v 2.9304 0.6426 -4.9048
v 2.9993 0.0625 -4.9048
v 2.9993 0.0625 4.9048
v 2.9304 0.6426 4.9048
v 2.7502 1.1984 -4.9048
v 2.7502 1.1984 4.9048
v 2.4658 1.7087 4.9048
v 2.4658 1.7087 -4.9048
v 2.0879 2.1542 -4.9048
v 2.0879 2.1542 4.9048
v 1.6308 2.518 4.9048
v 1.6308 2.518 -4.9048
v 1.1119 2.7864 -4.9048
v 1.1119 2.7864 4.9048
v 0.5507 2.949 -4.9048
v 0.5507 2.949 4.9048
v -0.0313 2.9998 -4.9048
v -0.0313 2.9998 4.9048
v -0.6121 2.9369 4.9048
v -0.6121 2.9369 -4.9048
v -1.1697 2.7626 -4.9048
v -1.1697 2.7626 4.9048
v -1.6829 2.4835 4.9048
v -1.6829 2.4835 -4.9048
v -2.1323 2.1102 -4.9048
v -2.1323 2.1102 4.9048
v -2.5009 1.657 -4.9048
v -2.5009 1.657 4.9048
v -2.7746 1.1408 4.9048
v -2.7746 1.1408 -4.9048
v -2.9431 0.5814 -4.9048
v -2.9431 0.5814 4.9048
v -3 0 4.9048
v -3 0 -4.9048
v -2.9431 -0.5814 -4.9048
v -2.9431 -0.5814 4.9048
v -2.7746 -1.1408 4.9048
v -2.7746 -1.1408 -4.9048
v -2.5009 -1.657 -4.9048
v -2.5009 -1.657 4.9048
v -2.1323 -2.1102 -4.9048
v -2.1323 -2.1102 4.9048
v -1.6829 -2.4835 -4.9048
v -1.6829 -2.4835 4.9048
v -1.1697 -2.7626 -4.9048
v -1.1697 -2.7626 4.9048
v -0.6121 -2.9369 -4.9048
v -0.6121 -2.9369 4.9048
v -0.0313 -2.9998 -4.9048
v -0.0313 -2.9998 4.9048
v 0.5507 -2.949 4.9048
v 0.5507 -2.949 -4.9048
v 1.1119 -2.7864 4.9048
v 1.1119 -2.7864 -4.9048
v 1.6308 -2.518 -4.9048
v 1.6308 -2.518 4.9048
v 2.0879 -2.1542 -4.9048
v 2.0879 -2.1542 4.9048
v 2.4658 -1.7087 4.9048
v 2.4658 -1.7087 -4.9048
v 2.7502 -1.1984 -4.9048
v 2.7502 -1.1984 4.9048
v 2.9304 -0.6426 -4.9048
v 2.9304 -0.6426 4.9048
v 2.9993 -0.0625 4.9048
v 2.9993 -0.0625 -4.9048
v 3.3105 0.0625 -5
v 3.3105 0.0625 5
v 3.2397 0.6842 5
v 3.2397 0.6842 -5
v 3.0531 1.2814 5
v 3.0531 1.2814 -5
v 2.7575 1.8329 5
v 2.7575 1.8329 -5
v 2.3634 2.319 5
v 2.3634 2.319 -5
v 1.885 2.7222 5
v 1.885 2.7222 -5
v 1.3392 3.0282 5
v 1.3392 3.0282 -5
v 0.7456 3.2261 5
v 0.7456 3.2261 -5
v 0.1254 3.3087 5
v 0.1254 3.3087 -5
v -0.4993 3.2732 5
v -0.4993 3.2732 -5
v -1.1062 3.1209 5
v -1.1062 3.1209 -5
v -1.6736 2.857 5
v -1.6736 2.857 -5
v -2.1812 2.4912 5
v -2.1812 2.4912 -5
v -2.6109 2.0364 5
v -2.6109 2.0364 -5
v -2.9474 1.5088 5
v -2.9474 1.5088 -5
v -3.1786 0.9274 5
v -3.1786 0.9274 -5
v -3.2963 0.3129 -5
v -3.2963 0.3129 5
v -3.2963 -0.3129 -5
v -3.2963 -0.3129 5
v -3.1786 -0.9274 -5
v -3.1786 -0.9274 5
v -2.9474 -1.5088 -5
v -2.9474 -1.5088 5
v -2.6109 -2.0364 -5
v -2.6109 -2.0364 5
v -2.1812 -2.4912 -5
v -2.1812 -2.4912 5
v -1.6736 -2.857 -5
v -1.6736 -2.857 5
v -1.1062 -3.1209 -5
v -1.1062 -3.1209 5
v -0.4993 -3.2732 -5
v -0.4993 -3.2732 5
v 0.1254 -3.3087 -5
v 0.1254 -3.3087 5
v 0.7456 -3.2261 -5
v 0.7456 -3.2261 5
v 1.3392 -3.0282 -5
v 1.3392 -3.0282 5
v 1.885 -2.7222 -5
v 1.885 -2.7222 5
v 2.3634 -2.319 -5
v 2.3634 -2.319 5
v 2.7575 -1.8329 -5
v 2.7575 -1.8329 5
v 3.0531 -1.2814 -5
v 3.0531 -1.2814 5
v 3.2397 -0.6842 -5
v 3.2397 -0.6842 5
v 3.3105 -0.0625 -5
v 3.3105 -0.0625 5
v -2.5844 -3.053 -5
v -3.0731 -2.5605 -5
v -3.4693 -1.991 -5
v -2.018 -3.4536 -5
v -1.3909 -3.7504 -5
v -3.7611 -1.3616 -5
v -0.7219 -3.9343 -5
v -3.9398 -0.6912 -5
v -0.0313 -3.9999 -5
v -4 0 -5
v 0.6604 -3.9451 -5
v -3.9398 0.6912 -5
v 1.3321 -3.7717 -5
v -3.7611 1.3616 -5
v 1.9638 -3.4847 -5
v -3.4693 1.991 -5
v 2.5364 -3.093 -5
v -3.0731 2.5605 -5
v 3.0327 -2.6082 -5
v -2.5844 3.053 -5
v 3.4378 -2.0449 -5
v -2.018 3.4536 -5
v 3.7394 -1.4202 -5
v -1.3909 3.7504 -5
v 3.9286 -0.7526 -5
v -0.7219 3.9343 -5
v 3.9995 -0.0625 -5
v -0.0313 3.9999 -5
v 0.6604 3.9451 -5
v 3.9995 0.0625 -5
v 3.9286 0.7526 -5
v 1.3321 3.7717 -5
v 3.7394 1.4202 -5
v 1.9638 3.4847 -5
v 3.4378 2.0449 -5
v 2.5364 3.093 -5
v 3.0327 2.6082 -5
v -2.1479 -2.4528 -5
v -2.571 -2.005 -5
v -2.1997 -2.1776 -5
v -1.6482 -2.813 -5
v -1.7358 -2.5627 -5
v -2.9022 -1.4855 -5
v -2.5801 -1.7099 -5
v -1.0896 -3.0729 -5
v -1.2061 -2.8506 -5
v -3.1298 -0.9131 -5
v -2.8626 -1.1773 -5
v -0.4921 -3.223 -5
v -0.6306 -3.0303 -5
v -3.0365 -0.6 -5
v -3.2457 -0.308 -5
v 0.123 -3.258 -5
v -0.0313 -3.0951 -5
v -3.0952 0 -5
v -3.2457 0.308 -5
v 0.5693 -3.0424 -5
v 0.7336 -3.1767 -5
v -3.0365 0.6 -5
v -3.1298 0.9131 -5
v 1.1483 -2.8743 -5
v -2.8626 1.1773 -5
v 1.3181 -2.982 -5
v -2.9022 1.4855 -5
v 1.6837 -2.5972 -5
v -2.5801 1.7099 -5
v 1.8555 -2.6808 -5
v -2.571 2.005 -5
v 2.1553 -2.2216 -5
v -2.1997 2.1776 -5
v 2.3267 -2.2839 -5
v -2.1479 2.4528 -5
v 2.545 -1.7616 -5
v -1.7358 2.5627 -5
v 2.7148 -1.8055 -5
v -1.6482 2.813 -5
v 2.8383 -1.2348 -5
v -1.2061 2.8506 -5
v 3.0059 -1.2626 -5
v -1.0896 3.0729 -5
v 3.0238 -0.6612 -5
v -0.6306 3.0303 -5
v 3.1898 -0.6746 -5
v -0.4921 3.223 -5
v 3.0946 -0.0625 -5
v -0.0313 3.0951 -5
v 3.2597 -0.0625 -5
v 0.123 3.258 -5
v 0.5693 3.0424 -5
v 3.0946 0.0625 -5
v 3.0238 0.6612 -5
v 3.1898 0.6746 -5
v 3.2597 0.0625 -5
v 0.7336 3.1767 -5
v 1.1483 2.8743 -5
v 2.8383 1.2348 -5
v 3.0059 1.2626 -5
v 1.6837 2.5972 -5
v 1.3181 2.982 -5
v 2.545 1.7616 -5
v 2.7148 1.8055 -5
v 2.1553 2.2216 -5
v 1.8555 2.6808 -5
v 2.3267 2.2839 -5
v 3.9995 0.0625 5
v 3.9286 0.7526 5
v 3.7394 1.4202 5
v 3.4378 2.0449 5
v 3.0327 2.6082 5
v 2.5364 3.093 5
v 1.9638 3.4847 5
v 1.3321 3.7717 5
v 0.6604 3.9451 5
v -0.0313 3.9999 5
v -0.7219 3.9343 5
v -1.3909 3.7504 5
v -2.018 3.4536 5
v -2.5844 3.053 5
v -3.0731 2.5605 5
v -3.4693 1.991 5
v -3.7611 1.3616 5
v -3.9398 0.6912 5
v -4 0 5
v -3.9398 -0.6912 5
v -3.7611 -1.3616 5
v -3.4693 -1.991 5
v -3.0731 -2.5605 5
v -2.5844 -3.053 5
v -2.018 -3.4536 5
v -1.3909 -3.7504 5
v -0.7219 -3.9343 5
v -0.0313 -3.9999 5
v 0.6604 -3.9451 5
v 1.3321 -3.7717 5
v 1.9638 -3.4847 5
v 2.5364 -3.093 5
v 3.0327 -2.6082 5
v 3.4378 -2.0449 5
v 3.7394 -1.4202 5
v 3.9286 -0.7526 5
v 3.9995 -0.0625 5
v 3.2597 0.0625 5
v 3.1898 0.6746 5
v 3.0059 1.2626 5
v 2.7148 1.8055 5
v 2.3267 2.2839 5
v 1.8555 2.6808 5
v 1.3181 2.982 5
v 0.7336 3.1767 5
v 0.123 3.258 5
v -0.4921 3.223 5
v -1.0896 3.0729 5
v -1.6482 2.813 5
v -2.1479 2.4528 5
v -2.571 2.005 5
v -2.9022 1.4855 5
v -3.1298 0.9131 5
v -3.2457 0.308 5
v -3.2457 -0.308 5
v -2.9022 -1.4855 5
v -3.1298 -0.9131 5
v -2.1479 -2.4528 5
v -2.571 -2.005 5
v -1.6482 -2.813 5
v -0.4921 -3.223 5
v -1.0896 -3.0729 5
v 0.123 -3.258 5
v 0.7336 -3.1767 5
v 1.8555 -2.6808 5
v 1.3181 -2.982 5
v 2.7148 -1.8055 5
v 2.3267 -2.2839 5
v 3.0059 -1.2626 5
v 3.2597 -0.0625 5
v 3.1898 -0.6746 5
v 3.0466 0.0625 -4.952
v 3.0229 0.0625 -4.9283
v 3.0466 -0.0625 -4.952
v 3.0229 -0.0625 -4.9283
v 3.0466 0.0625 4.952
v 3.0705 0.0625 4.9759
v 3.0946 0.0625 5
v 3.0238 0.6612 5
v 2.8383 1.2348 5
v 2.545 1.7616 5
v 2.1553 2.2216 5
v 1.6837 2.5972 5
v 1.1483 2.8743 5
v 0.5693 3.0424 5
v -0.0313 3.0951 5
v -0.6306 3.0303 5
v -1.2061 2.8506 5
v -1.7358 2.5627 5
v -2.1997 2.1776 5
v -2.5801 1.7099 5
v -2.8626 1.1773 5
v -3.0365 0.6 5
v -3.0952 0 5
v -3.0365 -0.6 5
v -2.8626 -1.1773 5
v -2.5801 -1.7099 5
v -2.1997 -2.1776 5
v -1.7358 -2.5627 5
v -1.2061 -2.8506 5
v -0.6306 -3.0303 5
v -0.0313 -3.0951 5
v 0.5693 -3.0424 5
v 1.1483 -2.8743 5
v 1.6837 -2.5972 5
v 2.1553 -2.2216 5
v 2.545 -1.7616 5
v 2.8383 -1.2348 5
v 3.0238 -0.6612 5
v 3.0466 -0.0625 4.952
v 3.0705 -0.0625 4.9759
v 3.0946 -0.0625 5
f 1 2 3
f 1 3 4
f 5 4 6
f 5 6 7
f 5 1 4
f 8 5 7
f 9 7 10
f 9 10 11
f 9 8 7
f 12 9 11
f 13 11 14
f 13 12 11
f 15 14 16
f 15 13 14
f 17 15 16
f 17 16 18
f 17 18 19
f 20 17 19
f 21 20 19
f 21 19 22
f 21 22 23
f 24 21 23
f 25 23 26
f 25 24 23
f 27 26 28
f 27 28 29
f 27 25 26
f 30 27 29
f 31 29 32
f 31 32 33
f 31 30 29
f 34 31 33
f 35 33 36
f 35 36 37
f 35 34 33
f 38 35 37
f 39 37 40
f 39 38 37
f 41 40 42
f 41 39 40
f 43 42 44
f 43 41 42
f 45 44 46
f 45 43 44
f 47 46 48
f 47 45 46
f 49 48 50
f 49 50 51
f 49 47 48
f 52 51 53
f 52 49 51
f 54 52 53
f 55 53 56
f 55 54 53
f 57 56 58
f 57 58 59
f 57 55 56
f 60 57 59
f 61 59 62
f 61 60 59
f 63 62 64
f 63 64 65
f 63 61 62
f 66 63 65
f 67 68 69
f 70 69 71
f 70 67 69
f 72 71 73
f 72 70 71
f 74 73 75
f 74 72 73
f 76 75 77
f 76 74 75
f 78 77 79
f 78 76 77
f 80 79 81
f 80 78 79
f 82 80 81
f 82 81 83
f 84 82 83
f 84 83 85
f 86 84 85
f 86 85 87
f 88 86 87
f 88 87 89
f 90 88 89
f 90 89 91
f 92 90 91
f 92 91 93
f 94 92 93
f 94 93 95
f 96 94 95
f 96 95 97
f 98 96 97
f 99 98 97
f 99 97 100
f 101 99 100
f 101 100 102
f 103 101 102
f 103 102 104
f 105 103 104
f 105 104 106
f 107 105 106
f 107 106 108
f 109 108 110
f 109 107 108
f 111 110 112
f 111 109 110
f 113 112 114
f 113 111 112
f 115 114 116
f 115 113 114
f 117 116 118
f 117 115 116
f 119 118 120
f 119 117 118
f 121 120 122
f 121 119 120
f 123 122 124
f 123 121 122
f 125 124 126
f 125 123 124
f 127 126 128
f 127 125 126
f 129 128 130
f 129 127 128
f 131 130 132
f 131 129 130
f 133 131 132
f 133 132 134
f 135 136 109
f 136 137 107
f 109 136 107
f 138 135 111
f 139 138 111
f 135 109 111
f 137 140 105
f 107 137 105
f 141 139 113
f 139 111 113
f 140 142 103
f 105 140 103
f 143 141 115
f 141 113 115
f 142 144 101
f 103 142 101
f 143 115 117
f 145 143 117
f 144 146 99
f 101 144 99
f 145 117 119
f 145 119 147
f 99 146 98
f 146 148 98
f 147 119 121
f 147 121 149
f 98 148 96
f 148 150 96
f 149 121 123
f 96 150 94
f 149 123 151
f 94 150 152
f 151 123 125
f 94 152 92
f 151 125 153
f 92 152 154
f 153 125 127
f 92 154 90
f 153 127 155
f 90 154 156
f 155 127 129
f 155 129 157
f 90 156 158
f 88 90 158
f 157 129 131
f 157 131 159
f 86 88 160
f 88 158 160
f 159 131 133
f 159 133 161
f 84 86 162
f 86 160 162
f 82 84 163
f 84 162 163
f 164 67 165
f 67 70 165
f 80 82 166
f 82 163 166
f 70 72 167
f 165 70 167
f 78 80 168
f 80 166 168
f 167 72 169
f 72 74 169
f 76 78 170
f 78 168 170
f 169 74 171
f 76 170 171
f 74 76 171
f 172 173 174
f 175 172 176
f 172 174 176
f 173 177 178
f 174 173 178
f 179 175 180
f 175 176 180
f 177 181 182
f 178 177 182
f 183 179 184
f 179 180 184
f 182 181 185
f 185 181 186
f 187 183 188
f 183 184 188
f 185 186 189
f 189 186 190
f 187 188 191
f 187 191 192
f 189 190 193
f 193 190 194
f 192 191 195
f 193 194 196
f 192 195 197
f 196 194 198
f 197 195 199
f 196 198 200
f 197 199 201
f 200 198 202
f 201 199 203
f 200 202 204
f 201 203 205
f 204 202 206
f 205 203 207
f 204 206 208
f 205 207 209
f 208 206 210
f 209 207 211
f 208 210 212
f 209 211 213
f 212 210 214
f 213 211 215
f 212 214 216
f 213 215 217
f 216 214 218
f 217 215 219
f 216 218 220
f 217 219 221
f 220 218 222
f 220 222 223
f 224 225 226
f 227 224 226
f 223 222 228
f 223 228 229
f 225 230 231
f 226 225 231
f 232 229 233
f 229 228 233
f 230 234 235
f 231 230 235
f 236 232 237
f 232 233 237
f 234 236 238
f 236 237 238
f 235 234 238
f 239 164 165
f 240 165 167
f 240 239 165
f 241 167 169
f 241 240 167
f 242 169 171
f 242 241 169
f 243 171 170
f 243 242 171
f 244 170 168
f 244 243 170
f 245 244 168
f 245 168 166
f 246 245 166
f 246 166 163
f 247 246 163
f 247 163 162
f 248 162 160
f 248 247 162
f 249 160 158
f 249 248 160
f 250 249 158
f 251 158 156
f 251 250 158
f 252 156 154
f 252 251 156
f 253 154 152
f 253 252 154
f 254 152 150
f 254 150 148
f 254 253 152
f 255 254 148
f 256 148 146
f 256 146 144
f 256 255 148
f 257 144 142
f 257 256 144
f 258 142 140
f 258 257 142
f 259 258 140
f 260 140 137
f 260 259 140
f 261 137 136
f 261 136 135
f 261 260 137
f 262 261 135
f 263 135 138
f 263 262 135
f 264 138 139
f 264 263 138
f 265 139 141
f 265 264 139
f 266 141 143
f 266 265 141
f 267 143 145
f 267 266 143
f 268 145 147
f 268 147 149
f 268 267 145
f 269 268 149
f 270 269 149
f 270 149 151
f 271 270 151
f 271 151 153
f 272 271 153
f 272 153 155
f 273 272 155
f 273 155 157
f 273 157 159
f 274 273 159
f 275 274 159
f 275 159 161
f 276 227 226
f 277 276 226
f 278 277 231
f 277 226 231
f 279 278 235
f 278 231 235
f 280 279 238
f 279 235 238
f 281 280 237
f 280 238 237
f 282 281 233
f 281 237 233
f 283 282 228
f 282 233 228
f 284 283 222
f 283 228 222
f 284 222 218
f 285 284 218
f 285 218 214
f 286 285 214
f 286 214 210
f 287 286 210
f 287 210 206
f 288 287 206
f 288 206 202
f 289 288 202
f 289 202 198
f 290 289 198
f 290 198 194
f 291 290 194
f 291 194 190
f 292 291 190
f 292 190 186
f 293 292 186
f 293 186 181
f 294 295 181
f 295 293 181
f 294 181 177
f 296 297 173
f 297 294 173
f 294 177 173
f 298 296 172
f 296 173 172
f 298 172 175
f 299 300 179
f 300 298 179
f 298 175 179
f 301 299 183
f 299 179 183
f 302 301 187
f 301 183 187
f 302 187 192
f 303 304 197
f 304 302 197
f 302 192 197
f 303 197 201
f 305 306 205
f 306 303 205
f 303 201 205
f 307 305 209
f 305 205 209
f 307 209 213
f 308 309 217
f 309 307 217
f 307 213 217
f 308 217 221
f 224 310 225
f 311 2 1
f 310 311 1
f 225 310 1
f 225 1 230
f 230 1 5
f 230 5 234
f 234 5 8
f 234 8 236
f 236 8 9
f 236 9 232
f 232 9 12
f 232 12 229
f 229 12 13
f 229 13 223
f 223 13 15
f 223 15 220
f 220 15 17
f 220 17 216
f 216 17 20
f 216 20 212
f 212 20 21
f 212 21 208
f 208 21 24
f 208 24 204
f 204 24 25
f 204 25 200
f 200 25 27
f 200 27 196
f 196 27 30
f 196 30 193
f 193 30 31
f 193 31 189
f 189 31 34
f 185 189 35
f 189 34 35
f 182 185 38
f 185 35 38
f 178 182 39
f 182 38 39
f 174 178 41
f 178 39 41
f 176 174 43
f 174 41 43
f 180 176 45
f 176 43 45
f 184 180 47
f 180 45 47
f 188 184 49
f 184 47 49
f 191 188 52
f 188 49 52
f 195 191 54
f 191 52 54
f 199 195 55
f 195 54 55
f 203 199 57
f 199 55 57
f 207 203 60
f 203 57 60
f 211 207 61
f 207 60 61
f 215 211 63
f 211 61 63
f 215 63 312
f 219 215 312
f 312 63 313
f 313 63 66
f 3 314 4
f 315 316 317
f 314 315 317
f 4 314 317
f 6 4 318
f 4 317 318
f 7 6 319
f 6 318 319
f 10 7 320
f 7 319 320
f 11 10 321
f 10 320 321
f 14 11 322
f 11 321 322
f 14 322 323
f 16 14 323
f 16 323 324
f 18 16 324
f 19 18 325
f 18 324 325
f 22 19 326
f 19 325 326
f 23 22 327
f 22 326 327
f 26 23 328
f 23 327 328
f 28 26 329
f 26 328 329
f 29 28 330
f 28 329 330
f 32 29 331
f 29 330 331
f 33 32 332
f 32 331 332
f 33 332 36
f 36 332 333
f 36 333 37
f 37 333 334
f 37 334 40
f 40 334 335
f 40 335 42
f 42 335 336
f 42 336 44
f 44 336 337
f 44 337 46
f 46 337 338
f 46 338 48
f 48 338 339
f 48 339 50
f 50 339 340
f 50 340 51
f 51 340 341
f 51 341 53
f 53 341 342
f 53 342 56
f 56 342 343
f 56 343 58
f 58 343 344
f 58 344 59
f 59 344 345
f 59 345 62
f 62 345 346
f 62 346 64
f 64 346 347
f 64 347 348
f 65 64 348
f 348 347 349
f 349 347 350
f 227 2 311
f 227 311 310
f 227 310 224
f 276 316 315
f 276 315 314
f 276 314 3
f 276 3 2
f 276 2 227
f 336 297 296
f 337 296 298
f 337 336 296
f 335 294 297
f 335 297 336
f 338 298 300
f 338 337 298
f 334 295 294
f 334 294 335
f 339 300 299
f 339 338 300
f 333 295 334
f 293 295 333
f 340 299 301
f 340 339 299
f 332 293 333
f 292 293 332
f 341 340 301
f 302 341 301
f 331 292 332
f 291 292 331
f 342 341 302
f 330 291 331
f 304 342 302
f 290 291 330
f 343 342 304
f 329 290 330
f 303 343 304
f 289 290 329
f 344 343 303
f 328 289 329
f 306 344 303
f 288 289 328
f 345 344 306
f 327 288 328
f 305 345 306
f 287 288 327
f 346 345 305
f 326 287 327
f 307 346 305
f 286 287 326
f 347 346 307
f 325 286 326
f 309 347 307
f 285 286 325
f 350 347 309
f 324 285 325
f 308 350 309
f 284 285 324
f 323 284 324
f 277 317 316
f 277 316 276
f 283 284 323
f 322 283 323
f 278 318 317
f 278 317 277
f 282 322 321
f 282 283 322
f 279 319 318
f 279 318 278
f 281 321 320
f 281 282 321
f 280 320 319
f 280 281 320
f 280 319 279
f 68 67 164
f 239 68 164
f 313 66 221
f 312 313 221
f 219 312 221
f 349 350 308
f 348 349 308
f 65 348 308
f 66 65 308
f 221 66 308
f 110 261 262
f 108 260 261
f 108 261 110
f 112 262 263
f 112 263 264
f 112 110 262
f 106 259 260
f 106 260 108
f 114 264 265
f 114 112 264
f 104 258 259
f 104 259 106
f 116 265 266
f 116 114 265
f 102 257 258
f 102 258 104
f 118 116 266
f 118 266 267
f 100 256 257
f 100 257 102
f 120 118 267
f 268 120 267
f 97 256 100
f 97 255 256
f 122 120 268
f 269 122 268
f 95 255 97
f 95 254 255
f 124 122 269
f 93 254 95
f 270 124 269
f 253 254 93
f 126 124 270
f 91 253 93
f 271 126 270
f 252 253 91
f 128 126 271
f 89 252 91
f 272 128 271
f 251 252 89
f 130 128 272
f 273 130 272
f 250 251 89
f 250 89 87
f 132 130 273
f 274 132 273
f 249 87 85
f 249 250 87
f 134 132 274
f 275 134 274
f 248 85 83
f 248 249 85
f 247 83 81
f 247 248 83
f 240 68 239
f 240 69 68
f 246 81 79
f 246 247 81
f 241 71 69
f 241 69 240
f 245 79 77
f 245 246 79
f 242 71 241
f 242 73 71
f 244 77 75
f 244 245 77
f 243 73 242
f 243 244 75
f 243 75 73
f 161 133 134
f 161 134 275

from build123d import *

# Parameters (mm, degrees)
SKETCH1_R                    = 4
SKETCH1_R_2                  = 3
BOSS_EXTRUDE1_DEPTH          = 5
CUT_EXTRUDE_THIN1_DEPTH      = 8.549834435
CUT_EXTRUDE_THIN1_DEPTH_BACK = 8.549834435
SKETCH2_R                    = 3.311114286
SKETCH2_R_2                  = 3.260314286
CHAMFER1_SIZE                = 0.095238095
SKETCH4_W                    = 4
SKETCH4_H                    = 0.125
CUT_EXTRUDE_THIN5_DEPTH      = 12.489125293


with BuildPart() as part:
    # Sketch1 → Boss-Extrude1 (new, symmetric)
    with BuildSketch(Plane.XY):
        Circle(SKETCH1_R)
        Circle(SKETCH1_R_2, mode=Mode.SUBTRACT)
    extrude(amount=BOSS_EXTRUDE1_DEPTH, both=True)

    # Sketch2 → Cut-Extrude-Thin1 (cut, two sides: drawn at the far end of the back side and taken through both)
    with BuildSketch(Plane.XY.offset(-CUT_EXTRUDE_THIN1_DEPTH_BACK)):
        Circle(SKETCH2_R)
        Circle(SKETCH2_R_2, mode=Mode.SUBTRACT)
    extrude(amount=CUT_EXTRUDE_THIN1_DEPTH + CUT_EXTRUDE_THIN1_DEPTH_BACK, mode=Mode.SUBTRACT)


with BuildPart() as cut_extrude_thin1_piece_1:
    # of the separate pieces the step leaves, piece 1, a body of its own (cut_extrude_thin1_pieces)
    add(part.part.solids().sort_by_distance((4, 0, -5))[0])


with BuildPart() as cut_extrude_thin1_piece_2:
    # of the separate pieces the step leaves, piece 2, a body of its own (cut_extrude_thin1_pieces)
    add(part.part.solids().sort_by_distance((3.260314286, 0, -5))[0])

    # Chamfer1
    chamfer1_edges = [cut_extrude_thin1_piece_2.edges().sort_by_distance(p)[0] for p in [
        (-3, 0, -5),
        (-3, 0, 5),
    ]]
    chamfer(chamfer1_edges, length=CHAMFER1_SIZE)


with BuildPart() as cut_extrude_thin5_tool:
    # Sketch4 → Cut-Extrude-Thin5 (new, through all)
    with BuildSketch(Plane.XY.offset(5)):
        with Locations((2, 0)):
            Rectangle(SKETCH4_W, SKETCH4_H)
    extrude(amount=-CUT_EXTRUDE_THIN5_DEPTH)


with BuildPart() as cut_extrude_thin1_piece_1_1:
    add(cut_extrude_thin1_piece_1.part)

    # Cut-Extrude-Thin5: cut by cut_extrude_thin5_tool
    add(cut_extrude_thin5_tool.part, mode=Mode.SUBTRACT)


with BuildPart() as cut_extrude_thin1_piece_2_1:
    add(cut_extrude_thin1_piece_2.part)

    # Cut-Extrude-Thin5: cut by cut_extrude_thin5_tool
    add(cut_extrude_thin5_tool.part, mode=Mode.SUBTRACT)


solid = Compound([cut_extrude_thin1_piece_1_1.part, cut_extrude_thin1_piece_2_1.part])
